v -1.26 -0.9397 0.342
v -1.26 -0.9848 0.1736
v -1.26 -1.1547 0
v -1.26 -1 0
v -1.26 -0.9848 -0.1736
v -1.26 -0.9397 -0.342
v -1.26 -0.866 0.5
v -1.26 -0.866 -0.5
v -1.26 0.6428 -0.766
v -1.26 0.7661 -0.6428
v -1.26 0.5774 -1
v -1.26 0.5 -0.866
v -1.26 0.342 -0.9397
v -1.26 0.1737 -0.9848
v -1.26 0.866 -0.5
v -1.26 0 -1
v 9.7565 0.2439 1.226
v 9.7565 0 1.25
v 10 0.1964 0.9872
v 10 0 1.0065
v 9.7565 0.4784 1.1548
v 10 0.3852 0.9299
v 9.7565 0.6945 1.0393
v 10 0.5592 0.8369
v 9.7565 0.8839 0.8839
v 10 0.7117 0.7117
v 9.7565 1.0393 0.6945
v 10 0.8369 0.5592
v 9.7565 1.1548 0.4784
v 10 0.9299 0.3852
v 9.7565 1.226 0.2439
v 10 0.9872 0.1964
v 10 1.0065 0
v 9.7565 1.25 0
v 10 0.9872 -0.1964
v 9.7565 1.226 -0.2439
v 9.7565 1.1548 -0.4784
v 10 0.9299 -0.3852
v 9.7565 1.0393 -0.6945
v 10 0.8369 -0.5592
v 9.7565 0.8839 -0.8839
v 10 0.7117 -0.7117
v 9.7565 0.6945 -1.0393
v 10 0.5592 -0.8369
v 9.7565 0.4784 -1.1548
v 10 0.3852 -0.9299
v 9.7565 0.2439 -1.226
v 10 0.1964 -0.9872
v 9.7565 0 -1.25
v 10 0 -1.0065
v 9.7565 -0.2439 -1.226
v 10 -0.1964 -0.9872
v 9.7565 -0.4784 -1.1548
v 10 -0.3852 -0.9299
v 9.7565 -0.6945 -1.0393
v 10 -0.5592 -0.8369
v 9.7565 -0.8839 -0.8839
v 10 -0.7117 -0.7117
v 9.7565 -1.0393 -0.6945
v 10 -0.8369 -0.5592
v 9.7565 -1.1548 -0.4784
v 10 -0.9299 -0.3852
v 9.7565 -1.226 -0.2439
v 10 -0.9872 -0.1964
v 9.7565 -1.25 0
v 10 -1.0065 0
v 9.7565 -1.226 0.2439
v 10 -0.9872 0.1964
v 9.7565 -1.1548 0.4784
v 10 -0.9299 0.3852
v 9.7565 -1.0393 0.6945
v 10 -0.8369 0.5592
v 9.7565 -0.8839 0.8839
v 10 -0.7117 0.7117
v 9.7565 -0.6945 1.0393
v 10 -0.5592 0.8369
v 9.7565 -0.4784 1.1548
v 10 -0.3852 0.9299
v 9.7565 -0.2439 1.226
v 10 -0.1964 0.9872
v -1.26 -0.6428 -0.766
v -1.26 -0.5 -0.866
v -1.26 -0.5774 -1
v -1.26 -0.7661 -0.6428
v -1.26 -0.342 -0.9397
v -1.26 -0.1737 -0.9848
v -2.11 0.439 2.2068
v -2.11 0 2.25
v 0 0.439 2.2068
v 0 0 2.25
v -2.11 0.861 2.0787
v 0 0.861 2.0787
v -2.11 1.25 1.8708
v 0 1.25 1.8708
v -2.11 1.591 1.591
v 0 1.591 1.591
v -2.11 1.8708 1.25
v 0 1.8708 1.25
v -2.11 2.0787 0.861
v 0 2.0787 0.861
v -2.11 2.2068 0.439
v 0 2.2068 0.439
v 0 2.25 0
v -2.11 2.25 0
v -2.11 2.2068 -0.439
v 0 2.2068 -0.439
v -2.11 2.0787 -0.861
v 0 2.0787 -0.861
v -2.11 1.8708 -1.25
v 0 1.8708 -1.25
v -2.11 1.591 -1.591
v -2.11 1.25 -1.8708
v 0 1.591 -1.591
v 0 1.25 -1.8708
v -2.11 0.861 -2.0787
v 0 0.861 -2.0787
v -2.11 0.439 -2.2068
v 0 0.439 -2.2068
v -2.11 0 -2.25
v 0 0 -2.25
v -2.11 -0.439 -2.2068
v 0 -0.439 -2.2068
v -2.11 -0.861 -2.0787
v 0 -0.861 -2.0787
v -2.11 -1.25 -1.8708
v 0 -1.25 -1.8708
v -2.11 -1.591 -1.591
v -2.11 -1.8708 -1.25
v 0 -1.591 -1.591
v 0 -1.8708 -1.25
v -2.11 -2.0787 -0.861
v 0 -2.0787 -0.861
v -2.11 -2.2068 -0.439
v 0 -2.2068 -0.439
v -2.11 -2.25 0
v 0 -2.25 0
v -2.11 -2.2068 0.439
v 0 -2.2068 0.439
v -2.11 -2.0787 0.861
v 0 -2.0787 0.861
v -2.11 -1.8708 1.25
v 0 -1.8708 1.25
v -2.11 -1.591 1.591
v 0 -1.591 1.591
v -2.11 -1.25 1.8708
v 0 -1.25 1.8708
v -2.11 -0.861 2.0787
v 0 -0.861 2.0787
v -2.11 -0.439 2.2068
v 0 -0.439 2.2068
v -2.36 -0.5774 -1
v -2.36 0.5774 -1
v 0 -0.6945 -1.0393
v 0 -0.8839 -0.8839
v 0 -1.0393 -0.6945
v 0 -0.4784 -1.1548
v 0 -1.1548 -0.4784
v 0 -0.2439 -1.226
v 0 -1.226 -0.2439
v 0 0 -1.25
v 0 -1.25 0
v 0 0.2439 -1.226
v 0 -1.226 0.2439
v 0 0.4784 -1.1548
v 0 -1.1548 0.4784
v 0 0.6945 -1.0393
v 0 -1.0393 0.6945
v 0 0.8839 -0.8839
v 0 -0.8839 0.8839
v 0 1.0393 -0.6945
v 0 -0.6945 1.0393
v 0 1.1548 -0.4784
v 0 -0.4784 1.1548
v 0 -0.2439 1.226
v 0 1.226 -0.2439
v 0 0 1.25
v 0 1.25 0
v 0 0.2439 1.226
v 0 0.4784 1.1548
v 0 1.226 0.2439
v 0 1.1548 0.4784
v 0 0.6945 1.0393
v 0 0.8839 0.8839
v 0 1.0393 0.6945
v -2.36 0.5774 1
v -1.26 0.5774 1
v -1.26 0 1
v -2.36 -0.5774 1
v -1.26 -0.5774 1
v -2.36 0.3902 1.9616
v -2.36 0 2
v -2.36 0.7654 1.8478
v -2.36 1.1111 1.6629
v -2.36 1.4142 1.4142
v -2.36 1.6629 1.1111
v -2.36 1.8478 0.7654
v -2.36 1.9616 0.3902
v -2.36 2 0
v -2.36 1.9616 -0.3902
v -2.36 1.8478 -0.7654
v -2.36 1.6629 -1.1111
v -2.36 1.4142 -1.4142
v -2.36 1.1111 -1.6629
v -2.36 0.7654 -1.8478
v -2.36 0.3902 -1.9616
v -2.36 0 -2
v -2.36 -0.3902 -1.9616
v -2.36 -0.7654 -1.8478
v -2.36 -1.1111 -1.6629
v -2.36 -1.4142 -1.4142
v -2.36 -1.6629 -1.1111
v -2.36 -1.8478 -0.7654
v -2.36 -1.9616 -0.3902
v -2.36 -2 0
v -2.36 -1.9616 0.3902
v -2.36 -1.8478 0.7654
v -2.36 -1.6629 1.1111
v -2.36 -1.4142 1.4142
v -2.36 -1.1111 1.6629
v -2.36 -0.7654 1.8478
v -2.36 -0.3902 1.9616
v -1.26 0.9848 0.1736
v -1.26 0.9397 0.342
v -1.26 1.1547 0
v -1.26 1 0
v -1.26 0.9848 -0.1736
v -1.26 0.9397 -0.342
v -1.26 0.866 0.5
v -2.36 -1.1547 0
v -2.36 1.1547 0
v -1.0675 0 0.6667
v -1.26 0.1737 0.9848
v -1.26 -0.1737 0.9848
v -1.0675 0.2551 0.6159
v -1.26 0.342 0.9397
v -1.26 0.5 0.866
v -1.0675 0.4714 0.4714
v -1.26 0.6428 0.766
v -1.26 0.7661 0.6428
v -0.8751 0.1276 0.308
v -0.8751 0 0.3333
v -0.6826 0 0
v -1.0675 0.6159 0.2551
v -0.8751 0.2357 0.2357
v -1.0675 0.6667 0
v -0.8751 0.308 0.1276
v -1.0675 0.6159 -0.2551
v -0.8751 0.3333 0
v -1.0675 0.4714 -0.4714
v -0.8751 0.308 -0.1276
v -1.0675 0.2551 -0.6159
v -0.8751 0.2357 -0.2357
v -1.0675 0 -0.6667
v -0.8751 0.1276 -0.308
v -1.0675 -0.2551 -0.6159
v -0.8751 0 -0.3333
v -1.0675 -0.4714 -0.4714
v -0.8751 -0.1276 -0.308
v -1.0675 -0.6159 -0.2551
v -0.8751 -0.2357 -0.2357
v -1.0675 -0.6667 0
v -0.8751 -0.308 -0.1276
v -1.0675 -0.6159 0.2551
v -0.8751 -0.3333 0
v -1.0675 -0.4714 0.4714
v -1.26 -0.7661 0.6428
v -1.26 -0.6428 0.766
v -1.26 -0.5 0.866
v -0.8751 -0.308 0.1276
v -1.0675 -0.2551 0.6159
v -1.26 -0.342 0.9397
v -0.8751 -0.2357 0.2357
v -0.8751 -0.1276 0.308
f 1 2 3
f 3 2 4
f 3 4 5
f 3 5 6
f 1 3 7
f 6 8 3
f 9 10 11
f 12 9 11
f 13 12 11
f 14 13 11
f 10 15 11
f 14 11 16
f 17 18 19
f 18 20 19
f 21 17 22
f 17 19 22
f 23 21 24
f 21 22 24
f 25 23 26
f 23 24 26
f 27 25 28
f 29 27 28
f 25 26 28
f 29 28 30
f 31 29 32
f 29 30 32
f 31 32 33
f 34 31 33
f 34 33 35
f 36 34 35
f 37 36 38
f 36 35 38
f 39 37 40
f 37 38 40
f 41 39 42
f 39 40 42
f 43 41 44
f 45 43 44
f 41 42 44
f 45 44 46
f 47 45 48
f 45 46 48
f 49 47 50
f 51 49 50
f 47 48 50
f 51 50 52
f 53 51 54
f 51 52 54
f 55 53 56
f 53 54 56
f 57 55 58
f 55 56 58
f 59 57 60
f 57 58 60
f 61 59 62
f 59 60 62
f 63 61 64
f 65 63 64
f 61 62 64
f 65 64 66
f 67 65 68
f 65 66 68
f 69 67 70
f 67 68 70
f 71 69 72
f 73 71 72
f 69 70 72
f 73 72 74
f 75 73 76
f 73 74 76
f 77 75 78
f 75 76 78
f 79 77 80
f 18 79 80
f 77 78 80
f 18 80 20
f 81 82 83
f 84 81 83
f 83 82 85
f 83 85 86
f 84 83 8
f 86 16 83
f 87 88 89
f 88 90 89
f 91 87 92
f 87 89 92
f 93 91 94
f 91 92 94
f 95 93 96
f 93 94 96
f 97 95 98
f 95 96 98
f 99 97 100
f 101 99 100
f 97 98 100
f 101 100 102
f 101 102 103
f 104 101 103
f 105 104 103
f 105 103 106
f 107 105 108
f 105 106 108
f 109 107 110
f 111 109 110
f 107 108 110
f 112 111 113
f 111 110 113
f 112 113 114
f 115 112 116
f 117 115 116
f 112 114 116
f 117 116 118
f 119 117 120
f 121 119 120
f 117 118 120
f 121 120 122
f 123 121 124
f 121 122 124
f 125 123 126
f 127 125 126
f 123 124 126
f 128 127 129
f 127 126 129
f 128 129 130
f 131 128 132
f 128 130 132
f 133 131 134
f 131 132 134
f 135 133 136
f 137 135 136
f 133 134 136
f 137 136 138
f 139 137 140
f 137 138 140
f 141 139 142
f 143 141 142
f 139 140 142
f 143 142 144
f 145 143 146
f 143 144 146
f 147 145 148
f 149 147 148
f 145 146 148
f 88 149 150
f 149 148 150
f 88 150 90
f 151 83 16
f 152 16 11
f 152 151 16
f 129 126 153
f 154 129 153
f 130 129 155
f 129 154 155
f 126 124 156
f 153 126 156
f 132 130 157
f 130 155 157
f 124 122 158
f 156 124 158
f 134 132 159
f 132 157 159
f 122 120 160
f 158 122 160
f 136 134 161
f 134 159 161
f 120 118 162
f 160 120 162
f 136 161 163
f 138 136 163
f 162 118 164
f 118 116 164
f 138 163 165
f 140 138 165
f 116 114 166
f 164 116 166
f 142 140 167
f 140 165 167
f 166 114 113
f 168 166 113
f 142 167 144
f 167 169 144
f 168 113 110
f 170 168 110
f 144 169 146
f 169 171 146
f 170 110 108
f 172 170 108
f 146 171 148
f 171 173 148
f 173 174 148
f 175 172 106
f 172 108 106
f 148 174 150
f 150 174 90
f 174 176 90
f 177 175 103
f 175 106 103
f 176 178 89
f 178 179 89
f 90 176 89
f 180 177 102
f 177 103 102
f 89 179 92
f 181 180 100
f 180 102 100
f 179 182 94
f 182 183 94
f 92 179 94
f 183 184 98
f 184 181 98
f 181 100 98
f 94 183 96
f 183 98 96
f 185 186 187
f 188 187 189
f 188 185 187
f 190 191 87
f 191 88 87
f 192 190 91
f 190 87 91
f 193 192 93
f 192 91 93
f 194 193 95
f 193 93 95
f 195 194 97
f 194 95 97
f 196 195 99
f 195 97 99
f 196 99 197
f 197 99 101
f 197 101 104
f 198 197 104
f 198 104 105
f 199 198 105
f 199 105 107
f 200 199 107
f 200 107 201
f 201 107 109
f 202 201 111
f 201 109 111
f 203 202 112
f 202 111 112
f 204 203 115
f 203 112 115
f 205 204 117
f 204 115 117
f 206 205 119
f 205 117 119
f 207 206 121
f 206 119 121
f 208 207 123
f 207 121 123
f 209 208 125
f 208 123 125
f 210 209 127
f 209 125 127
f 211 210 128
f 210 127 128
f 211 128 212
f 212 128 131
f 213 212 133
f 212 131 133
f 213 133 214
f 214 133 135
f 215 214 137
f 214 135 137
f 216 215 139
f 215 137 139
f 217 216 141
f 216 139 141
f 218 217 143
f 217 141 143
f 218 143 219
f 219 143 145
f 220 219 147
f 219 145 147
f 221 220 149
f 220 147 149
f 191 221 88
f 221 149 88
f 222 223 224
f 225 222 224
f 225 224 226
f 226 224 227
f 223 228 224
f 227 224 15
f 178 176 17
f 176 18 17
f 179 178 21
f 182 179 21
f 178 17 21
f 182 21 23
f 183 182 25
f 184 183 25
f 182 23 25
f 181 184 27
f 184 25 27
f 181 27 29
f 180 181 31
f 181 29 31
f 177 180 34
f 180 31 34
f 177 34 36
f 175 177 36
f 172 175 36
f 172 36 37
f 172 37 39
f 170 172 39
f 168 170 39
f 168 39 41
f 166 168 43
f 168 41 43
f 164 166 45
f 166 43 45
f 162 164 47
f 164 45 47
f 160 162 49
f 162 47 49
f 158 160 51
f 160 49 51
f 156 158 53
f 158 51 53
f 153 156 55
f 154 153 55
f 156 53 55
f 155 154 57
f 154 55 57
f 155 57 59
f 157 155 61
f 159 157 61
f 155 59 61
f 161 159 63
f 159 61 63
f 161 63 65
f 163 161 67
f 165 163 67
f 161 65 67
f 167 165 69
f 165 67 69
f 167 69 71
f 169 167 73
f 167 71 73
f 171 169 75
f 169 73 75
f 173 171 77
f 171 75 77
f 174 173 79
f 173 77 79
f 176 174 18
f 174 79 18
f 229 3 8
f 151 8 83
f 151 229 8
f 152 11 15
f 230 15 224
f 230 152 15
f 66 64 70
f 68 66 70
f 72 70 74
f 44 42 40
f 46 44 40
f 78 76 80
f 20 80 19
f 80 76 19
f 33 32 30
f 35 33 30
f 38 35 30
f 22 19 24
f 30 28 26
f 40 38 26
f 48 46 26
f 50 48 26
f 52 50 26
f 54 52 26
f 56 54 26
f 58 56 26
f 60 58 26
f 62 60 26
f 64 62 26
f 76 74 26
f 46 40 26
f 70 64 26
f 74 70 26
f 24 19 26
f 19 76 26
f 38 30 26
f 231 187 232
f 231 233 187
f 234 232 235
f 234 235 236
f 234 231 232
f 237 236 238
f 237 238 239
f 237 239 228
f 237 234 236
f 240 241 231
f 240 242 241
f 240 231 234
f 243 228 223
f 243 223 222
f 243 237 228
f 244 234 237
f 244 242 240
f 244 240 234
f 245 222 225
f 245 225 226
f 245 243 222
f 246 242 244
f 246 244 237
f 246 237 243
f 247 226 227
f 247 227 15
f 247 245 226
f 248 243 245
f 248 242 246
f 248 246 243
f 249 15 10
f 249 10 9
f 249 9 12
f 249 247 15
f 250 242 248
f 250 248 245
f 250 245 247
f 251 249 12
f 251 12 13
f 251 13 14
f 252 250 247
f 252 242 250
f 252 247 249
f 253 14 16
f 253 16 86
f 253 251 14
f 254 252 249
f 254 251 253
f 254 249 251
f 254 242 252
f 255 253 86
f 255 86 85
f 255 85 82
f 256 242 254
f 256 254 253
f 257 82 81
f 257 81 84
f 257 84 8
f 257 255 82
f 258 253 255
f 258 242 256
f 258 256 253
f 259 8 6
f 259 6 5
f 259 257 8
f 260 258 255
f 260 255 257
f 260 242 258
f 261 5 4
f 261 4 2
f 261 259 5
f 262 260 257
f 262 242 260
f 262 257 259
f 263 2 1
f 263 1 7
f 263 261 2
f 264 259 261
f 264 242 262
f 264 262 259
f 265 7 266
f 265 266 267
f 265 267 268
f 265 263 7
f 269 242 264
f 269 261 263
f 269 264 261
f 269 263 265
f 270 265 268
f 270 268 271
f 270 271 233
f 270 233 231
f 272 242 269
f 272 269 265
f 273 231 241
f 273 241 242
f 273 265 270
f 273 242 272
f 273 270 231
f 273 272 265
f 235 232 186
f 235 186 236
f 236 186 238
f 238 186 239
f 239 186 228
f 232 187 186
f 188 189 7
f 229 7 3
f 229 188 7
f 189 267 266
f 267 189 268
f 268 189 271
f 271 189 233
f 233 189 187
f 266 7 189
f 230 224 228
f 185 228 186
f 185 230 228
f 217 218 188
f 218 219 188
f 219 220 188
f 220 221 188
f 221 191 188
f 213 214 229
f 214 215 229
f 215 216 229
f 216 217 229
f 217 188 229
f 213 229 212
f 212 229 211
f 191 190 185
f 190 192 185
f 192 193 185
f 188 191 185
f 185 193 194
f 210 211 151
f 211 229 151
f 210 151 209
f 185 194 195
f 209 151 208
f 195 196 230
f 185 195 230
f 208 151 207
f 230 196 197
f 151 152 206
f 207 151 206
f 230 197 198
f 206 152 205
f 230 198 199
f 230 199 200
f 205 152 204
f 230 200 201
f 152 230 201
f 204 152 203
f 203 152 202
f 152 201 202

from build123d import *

# Parameters (mm, degrees)
CUT_EXTRUDE_1_DEPTH = 1.1


with BuildPart() as part:
    # 草图1 → 旋转1 (revolve)
    with BuildSketch(Plane.XY):
        Polygon((-2.36, 0), (-2.36, 2), (-2.11, 2.25), (0, 2.25), (0, 1.25), (9.7565, 1.25), (10, 1.0065), (10, 0), align=None)
    revolve(axis=Axis((10, 0, 0), (-1, 0, 0)))

    # 草图2 → 切除-拉伸1 (cut)
    with BuildSketch(Plane(origin=(-2.36, 0, 0), x_dir=(0, 0, -1), z_dir=(1, 0, 0))):
        Polygon((-1, 0.577350269), (-1, -0.577350269), (0, -1.154700538), (1, -0.577350269), (1, 0.577350269), (0, 1.154700538), align=None)
    extrude(amount=CUT_EXTRUDE_1_DEPTH, mode=Mode.SUBTRACT)

    # 草图3 → 切除-旋转1 (revolve, cut)
    with BuildSketch(Plane.XY):
        Polygon((-1.26, 0), (-1.26, 1), (-0.682649731, 0), align=None)
    revolve(axis=Axis((-0.682649731, 0, 0), (-1, 0, 0)), mode=Mode.SUBTRACT)


solid = part.part
